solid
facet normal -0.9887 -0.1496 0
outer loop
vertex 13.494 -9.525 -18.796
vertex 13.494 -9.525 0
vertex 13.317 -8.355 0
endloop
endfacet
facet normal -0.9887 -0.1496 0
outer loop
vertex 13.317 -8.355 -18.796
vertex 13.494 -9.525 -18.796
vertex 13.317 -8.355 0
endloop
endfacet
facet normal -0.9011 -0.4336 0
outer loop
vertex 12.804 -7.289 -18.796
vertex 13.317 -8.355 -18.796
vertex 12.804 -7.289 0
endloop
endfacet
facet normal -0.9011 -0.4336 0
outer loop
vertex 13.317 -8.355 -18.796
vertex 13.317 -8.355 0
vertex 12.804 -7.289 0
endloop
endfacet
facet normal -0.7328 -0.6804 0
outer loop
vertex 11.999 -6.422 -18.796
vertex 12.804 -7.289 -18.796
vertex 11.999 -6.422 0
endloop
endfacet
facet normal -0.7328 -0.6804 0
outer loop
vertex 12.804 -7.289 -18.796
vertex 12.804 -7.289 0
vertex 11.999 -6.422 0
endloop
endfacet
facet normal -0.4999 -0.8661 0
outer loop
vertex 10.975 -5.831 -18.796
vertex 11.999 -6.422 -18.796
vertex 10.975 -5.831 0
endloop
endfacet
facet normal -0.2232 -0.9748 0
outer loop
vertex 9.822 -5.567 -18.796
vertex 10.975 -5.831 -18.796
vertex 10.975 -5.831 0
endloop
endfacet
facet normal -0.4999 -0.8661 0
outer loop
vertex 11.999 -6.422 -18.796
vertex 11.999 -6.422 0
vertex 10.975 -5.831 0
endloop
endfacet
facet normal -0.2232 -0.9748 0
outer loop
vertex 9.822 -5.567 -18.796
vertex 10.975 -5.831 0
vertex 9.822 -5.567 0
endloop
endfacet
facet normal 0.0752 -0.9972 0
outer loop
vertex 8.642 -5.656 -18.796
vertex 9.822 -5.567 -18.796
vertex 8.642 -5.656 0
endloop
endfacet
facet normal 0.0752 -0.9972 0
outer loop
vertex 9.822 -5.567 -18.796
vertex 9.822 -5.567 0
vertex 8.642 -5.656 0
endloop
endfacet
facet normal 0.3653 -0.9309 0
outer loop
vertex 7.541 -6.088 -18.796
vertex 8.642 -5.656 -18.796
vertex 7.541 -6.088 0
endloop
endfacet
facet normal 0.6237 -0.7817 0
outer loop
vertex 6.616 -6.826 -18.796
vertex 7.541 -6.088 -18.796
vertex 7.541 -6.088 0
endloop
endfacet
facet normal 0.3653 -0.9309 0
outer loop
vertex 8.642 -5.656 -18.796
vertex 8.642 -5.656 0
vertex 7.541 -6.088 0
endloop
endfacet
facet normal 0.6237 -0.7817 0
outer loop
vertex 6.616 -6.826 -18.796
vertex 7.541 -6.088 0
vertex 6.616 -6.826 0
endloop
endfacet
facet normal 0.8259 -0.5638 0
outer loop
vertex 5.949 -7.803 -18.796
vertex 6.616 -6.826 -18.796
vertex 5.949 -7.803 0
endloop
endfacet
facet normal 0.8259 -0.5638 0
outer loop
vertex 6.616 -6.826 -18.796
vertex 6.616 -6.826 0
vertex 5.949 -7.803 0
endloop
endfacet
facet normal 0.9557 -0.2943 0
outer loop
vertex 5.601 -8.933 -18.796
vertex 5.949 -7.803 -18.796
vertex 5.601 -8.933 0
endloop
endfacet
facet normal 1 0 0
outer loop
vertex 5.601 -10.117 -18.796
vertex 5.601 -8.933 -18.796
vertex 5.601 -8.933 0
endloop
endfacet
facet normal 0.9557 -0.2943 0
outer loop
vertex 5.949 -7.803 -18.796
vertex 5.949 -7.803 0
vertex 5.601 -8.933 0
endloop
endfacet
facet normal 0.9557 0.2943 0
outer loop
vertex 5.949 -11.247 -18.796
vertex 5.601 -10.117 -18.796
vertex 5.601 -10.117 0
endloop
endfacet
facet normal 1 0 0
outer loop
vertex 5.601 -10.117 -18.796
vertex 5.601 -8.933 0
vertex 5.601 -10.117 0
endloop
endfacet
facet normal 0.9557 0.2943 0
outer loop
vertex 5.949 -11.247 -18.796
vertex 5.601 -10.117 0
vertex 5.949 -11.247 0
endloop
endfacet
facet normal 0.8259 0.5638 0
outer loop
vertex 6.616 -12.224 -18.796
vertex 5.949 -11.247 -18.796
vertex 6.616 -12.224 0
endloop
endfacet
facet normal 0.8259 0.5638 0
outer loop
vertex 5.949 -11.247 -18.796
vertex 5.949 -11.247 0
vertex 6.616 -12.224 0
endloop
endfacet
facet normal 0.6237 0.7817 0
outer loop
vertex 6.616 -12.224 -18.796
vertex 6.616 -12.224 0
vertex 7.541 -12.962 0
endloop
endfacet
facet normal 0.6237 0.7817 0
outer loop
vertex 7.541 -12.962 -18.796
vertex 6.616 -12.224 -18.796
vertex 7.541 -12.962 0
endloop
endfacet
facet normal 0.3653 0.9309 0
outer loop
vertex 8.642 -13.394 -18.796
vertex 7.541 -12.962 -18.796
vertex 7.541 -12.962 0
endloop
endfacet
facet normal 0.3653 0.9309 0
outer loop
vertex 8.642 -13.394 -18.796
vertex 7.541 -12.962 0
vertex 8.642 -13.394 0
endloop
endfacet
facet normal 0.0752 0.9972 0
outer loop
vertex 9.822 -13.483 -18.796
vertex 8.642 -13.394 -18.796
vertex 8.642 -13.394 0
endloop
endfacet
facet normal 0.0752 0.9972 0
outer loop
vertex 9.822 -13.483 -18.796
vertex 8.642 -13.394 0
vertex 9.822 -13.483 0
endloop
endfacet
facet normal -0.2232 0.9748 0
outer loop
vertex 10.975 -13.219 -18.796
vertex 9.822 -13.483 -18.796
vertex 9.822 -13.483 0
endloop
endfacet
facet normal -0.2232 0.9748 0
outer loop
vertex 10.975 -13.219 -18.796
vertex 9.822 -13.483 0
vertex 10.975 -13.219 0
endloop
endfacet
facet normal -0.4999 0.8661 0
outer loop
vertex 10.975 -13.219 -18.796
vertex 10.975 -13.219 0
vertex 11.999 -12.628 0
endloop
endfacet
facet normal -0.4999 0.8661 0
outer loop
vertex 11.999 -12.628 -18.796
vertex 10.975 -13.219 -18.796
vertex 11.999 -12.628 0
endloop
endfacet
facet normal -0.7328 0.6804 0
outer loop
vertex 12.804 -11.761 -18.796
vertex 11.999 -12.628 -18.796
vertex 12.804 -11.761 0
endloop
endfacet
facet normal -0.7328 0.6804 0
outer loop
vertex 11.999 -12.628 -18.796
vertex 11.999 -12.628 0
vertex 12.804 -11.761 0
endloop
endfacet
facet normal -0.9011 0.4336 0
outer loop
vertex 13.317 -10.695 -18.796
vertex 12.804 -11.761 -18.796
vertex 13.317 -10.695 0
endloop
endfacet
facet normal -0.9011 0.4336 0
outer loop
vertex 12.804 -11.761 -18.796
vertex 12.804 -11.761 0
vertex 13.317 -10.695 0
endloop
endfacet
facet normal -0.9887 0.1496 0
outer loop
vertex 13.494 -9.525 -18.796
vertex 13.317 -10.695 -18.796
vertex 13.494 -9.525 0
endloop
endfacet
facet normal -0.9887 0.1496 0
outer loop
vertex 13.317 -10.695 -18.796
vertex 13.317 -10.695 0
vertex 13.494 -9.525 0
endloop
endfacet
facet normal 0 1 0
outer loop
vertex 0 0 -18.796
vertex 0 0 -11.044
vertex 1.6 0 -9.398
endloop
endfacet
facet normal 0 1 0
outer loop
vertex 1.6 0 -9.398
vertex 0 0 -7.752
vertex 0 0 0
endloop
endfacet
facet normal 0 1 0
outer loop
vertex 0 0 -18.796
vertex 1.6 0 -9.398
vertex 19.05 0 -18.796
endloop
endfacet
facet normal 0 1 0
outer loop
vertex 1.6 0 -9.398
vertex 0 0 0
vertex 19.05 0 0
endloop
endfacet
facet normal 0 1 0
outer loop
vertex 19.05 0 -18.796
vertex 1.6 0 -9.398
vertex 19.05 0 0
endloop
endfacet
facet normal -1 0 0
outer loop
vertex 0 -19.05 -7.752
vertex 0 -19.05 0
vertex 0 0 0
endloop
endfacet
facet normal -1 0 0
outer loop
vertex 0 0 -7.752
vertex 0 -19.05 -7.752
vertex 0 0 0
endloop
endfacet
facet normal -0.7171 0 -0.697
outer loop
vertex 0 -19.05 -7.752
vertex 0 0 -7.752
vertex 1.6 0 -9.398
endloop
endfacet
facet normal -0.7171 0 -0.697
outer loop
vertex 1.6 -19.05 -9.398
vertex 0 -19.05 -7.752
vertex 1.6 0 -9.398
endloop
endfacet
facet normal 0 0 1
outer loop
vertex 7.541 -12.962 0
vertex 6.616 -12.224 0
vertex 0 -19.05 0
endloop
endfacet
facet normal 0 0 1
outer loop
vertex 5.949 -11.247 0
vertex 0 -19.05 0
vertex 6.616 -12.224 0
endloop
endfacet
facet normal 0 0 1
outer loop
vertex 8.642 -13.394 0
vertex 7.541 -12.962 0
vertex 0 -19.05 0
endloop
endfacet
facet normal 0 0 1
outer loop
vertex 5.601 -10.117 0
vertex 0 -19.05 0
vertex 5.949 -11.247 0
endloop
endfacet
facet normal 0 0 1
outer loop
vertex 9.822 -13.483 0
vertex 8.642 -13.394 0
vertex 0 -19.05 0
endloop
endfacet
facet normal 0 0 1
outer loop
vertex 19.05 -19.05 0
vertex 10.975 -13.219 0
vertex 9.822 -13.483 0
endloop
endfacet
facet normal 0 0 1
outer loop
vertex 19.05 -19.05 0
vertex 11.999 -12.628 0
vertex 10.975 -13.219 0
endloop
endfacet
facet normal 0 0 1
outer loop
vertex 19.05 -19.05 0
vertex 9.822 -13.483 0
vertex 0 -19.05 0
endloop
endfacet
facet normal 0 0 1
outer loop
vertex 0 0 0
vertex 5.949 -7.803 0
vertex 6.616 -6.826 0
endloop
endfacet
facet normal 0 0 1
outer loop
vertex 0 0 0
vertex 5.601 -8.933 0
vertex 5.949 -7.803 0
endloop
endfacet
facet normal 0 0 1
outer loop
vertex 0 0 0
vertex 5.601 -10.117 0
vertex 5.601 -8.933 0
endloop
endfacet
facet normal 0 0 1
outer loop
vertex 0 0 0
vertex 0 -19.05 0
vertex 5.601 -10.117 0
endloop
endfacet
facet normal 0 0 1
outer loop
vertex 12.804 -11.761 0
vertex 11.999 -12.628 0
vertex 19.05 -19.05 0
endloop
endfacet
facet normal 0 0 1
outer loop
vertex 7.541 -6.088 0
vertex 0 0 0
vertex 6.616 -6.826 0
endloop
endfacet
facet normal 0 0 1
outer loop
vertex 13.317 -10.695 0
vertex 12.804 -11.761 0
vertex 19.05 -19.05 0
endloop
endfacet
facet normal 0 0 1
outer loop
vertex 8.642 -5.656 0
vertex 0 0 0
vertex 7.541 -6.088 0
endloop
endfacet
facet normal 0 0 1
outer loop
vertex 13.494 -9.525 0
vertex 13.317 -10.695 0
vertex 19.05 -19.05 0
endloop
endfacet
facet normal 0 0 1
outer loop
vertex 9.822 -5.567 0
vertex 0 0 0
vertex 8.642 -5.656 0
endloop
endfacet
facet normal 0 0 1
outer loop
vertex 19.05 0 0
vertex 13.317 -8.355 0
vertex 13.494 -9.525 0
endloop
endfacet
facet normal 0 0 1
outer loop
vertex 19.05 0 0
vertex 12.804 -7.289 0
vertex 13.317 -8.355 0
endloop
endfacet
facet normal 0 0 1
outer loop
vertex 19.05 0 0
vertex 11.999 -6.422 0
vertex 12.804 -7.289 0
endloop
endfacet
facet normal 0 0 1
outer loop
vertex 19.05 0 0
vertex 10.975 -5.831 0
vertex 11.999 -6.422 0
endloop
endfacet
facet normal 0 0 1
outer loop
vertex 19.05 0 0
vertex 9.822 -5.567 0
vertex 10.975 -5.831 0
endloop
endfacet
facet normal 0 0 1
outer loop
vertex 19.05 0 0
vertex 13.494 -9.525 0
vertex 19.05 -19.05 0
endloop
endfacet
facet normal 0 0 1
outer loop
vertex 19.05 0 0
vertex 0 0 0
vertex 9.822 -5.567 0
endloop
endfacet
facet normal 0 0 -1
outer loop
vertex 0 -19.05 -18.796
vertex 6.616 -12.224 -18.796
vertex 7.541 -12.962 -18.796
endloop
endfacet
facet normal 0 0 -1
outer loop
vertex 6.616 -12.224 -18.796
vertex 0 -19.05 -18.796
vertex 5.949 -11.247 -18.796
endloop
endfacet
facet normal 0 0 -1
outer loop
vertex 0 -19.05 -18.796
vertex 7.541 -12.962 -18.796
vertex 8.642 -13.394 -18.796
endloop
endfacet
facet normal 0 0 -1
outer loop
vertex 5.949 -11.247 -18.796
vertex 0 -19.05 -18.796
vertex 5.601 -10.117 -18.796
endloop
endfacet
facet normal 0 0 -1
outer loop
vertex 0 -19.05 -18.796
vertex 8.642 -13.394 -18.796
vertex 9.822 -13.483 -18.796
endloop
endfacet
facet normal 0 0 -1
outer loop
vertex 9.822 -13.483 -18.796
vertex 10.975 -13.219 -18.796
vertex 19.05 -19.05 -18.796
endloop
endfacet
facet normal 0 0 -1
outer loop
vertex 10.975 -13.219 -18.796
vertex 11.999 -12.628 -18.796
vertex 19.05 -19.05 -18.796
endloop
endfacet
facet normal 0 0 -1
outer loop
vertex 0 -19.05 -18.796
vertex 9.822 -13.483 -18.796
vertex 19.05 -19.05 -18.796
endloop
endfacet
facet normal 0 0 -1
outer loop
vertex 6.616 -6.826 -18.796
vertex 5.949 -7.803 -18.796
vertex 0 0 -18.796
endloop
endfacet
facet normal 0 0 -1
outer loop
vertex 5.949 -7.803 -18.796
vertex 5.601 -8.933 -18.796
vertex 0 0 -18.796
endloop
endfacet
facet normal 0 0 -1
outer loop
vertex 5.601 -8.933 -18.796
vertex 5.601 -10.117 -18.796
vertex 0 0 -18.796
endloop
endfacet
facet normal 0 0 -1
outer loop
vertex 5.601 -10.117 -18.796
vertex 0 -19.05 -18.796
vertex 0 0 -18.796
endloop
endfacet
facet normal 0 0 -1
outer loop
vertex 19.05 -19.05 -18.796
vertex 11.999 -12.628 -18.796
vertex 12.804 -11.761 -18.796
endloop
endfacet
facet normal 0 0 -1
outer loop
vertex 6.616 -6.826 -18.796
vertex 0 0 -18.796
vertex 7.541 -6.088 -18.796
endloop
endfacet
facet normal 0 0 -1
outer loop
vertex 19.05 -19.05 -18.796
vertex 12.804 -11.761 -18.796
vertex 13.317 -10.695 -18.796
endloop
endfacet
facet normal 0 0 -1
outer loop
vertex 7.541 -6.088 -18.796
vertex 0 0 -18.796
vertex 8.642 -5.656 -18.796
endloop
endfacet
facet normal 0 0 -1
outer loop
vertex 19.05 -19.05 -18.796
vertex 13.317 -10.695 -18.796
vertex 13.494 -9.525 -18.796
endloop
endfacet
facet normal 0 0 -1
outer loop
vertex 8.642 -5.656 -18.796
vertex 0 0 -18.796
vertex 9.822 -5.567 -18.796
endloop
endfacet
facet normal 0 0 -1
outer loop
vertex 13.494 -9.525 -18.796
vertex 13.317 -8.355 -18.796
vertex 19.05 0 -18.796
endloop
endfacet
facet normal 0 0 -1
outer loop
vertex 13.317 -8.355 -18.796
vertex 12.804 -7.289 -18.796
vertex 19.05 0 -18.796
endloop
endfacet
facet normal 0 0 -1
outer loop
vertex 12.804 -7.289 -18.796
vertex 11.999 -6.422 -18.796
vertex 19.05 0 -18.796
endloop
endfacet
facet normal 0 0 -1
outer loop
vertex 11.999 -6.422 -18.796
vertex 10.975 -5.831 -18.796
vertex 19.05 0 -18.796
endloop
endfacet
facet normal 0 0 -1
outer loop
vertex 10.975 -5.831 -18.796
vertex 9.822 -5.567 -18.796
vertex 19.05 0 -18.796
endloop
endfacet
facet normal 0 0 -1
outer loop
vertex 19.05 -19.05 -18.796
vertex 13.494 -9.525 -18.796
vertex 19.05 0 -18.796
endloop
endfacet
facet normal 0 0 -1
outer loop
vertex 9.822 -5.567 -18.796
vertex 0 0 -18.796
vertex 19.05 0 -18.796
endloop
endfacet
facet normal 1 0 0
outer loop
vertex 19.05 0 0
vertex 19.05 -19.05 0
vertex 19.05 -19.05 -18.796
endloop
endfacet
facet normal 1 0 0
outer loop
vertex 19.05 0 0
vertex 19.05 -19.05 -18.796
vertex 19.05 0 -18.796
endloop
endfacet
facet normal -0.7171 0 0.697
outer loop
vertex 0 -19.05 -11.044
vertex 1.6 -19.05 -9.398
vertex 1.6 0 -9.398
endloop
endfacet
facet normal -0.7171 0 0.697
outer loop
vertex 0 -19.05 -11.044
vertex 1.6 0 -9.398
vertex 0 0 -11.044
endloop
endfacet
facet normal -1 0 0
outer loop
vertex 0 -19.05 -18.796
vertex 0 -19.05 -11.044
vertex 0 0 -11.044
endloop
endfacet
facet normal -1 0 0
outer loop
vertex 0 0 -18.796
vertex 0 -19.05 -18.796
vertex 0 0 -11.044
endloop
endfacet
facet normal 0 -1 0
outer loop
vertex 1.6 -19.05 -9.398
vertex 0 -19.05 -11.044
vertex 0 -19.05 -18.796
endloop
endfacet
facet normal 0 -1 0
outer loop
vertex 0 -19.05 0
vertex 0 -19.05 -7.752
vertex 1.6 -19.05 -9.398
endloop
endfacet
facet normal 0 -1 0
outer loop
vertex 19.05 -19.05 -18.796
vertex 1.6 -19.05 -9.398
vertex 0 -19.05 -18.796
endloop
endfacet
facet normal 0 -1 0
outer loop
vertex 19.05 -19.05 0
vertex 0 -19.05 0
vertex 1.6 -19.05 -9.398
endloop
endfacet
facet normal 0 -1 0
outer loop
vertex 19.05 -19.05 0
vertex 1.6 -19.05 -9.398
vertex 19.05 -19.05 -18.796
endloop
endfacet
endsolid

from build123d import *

# Parameters (mm, degrees)
SKETCH1_W               = 19.05
SKETCH1_H               = 19.05
SKETCH1_R               = 3.96875
BOSS_EXTRUDE1_DEPTH     = 18.796
CUT_EXTRUDE1_DEPTH      = 33.849575583
CUT_EXTRUDE1_DEPTH_BACK = 33.849575583


with BuildPart() as part:
    # Sketch1 → Boss-Extrude1 (new body)
    with BuildSketch(Plane.XY):
        with Locations((9.525, -9.525)):
            Rectangle(SKETCH1_W, SKETCH1_H)
        with Locations((9.525, -9.525)):
            Circle(SKETCH1_R, mode=Mode.SUBTRACT)
    extrude(amount=-BOSS_EXTRUDE1_DEPTH)

    # Sketch2 → Cut-Extrude1 (cut, two sides: drawn at the far end of the back side and taken through both)
    with BuildSketch(Plane(origin=(0, 0, 0), x_dir=(1, 0, 0), z_dir=(0, 1, 0)).offset(-CUT_EXTRUDE1_DEPTH_BACK)):
        Polygon((0, 7.751616068), (1.6002, 9.398), (0, 11.044383932), align=None)
    extrude(amount=CUT_EXTRUDE1_DEPTH + CUT_EXTRUDE1_DEPTH_BACK, mode=Mode.SUBTRACT)


solid = part.part
